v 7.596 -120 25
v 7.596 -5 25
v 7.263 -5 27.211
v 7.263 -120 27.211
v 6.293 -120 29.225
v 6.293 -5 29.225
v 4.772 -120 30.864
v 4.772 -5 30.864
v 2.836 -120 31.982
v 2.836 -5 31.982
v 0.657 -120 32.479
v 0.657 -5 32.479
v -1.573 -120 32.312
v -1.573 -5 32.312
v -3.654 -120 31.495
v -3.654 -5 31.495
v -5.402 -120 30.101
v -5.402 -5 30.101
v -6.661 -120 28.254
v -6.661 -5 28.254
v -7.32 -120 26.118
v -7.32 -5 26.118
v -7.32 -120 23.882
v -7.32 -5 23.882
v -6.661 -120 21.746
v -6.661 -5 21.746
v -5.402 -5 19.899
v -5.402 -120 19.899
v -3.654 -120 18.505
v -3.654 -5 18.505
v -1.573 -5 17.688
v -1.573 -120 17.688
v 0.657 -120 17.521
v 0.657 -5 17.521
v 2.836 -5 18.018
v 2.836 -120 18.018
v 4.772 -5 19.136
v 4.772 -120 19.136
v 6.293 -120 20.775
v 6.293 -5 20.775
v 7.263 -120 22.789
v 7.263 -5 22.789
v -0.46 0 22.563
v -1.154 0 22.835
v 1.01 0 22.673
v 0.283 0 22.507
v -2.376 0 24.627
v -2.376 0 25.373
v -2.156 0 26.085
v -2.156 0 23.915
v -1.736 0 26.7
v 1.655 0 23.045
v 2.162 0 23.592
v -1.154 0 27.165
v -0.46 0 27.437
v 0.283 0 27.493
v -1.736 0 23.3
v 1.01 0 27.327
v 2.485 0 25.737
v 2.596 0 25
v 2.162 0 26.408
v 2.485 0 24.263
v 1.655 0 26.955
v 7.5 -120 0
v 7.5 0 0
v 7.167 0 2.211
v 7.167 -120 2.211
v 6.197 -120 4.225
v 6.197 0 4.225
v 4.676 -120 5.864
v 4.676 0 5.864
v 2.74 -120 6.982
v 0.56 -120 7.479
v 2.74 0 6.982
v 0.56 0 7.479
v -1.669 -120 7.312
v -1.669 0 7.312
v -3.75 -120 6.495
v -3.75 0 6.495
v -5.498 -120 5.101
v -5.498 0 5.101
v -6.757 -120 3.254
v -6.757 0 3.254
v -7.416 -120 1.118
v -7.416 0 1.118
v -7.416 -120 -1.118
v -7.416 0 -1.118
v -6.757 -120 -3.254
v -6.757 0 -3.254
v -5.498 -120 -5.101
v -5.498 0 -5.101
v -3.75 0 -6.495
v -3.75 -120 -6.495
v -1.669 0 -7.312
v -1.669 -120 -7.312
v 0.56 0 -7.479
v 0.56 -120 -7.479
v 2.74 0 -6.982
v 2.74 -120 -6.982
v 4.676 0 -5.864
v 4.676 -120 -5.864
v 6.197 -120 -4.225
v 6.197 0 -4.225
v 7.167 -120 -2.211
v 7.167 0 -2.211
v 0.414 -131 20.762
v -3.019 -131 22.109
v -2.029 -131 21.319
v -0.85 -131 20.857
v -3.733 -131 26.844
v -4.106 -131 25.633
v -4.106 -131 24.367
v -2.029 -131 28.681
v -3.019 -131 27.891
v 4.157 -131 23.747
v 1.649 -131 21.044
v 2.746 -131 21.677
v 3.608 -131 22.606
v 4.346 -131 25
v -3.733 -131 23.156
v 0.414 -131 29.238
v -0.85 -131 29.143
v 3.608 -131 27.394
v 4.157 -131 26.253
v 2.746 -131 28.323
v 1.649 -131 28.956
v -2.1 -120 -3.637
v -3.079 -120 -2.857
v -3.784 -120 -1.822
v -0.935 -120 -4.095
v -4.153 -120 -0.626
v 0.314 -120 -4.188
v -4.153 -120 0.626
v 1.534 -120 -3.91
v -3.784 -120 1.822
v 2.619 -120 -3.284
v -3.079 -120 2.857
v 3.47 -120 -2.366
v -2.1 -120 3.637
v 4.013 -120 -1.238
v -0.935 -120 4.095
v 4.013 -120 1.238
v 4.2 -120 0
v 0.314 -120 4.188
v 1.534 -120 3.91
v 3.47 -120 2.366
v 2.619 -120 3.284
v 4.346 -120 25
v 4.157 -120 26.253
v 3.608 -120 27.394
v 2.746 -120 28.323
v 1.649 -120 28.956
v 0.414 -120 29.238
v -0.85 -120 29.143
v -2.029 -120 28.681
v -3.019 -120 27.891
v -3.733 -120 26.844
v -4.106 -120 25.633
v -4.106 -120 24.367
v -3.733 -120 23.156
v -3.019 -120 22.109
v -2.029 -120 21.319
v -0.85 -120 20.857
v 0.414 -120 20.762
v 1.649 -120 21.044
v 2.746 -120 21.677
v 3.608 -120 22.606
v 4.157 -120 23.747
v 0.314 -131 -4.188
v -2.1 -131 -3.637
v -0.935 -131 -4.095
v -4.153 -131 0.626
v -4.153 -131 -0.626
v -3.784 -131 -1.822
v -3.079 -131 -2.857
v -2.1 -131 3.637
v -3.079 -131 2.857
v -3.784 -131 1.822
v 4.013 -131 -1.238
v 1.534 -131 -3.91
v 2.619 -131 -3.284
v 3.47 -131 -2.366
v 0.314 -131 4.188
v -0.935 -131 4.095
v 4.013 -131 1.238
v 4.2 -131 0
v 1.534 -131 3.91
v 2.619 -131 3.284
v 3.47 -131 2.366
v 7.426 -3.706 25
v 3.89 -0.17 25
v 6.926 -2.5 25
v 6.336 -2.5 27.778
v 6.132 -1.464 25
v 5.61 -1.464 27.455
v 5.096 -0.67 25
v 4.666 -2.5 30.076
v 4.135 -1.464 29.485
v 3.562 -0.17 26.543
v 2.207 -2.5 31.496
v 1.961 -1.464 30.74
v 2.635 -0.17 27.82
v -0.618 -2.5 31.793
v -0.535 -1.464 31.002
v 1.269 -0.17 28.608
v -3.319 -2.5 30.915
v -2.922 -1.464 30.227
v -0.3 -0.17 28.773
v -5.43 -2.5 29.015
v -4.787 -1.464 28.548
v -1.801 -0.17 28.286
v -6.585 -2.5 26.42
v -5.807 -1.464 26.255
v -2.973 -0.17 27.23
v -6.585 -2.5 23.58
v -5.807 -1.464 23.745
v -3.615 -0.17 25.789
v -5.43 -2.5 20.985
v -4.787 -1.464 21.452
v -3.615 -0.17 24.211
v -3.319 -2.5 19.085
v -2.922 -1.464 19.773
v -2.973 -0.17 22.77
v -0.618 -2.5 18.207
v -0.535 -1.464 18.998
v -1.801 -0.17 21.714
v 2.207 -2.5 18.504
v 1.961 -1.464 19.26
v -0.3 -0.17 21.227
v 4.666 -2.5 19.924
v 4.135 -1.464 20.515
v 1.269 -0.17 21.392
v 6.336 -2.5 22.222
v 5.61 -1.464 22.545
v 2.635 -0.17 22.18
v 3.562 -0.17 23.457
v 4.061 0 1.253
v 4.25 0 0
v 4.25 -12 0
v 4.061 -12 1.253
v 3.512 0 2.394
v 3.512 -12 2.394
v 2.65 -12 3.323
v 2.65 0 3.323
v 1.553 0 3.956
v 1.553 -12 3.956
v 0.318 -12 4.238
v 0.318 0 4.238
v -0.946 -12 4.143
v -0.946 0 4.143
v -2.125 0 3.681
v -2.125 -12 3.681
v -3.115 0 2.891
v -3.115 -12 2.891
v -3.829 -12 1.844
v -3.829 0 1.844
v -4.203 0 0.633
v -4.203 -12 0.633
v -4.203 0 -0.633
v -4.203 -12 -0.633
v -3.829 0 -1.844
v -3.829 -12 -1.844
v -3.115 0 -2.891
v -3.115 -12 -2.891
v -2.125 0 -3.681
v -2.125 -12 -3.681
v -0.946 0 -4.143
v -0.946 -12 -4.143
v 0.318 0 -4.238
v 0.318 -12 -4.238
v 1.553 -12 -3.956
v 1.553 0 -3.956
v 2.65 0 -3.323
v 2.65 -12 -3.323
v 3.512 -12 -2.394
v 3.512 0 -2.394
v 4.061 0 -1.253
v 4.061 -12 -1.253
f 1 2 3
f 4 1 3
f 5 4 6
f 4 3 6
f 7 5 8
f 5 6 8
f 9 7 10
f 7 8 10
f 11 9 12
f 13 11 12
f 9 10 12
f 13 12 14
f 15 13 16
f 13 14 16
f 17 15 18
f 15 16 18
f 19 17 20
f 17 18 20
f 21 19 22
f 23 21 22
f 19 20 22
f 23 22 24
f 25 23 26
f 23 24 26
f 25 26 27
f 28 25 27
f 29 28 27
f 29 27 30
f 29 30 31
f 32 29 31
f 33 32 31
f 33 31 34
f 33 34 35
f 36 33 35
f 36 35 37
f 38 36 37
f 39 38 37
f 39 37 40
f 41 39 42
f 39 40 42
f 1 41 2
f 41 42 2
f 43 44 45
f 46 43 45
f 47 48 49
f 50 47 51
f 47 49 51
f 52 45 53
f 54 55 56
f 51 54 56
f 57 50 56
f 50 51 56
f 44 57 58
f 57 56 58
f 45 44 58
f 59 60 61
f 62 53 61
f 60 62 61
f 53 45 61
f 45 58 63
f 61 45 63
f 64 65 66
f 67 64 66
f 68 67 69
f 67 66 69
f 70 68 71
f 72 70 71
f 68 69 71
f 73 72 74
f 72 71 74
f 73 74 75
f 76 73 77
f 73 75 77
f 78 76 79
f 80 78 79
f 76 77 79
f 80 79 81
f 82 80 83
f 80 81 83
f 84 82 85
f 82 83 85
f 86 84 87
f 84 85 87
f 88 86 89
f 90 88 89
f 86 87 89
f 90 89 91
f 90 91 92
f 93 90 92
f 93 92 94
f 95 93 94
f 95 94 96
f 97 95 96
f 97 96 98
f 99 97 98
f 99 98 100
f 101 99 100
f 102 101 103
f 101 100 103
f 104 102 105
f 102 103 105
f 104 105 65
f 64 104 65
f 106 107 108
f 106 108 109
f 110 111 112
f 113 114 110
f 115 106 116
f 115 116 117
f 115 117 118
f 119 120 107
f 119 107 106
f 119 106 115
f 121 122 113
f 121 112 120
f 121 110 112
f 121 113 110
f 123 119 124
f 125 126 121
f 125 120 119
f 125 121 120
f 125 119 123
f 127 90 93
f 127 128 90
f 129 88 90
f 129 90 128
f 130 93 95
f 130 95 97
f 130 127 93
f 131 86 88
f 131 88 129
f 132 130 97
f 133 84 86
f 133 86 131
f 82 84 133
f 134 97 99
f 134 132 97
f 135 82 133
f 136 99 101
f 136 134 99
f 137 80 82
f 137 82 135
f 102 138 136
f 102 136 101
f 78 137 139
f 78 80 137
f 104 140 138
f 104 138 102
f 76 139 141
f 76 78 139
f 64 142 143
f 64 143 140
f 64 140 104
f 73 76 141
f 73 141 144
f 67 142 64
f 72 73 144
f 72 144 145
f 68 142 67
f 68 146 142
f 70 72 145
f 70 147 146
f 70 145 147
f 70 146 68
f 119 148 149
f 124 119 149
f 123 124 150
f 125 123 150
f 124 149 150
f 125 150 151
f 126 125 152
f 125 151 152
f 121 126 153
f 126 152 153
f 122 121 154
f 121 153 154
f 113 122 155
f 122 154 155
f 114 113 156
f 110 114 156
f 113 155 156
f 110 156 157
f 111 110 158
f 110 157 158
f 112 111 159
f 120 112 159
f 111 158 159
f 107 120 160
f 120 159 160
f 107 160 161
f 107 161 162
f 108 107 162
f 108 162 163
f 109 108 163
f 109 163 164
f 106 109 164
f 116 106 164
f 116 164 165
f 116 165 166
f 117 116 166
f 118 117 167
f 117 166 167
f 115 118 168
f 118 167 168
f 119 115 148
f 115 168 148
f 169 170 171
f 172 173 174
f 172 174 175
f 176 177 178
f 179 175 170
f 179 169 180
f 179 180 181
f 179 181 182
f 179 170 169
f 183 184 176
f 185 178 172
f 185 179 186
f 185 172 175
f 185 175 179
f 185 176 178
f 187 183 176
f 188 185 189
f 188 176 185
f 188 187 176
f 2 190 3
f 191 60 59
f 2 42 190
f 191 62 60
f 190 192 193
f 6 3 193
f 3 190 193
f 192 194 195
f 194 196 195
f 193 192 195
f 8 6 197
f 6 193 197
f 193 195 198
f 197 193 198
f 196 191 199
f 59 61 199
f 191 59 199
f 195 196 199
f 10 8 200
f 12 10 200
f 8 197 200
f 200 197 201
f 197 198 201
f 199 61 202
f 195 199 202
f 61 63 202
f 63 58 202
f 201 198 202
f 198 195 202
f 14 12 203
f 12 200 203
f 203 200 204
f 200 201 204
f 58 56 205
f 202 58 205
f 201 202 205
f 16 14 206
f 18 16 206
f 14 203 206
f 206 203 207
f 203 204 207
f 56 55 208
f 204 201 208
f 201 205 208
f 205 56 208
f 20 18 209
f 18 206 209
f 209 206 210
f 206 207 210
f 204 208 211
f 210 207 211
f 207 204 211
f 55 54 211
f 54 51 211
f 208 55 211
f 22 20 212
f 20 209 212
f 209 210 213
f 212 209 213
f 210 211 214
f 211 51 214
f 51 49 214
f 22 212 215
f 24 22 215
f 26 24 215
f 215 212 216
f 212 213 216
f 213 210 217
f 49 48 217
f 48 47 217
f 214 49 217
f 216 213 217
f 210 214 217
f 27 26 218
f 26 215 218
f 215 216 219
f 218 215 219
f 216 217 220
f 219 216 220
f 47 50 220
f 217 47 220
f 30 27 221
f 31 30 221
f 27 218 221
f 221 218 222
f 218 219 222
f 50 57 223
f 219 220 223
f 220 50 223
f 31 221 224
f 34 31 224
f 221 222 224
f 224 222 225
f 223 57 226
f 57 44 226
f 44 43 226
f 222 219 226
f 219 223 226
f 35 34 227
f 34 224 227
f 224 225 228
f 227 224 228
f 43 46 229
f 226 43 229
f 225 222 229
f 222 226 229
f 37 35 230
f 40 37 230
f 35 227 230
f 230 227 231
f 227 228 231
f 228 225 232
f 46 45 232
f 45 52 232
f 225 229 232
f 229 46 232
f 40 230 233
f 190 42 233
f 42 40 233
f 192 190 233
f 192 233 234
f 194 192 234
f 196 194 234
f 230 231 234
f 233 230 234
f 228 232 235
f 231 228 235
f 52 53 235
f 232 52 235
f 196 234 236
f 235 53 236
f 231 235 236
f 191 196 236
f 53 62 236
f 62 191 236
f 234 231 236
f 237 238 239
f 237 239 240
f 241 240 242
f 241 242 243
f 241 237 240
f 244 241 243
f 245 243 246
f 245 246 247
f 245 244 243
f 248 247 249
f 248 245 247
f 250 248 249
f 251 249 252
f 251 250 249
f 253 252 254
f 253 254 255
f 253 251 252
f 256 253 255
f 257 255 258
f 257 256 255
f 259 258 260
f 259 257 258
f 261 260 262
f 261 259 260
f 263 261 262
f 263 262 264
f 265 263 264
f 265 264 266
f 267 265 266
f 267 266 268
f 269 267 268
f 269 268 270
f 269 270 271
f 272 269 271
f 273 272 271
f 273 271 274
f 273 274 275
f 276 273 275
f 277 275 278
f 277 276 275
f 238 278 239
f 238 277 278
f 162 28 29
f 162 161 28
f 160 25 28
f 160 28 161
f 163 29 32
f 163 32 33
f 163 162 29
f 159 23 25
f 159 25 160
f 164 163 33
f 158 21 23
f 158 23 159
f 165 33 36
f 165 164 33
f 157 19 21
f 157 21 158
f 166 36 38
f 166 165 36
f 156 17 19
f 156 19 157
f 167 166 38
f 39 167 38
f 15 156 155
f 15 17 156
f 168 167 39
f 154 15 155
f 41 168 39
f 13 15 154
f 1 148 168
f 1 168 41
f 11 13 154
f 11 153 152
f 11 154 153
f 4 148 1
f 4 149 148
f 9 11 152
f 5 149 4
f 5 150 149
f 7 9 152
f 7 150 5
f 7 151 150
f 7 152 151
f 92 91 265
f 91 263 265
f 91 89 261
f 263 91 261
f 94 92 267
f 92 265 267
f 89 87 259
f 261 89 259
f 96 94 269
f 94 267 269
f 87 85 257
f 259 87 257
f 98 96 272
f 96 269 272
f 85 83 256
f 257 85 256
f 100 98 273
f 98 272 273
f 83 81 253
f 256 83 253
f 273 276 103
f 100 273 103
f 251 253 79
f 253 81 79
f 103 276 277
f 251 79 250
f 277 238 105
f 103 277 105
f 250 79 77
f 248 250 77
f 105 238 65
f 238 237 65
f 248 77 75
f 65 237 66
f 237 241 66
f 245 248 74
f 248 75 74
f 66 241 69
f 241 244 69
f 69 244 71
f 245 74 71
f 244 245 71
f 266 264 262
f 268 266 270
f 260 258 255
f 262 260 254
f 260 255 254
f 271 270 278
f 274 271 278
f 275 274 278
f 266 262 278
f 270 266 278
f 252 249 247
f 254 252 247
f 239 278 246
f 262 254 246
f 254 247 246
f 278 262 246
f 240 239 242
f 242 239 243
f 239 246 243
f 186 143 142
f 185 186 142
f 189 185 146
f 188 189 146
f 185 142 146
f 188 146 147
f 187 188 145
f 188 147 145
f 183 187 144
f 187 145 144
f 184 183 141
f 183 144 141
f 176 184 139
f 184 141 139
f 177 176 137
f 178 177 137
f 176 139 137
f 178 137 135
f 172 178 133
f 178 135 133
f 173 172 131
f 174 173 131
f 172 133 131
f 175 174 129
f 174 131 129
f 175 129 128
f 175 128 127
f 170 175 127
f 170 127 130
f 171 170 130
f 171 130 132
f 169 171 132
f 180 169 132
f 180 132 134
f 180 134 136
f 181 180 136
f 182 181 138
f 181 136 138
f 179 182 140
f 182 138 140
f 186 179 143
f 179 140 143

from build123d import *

# Parameters (mm, degrees)
F0_R     = 7.5
F0_R_2   = 4.25
F1_DEPTH = 120
F2_R     = 4.25
F3_DEPTH = 12
F4_R     = 4.2
F5_DEPTH = 11
F6_R     = 4.25
F7_DEPTH = 11
F8_R     = 5


with BuildPart() as f1:
    # F0 (on Front) → F1 (new body)
    with BuildSketch(Plane.XZ):
        Circle(F0_R)
        Circle(F0_R_2, mode=Mode.SUBTRACT)
        with Locations((0.096153, 25.000002)):
            Circle(F0_R)
        with Locations((0.096153, 25.000002)):
            Circle(F0_R_2, mode=Mode.SUBTRACT)
        Circle(F0_R_2)
        with Locations((0.096153, 25.000002)):
            Circle(F0_R_2)
    extrude(amount=F1_DEPTH)

    # F2 (on Front) → F3 (cut)
    with BuildSketch(Plane.XZ):
        Circle(F2_R)
    extrude(amount=F3_DEPTH, mode=Mode.SUBTRACT)

    # F4 (on face) → F5 (join)
    with BuildSketch(Plane.XZ.offset(120)):
        Circle(F4_R)
    extrude(amount=F5_DEPTH)

    # F6 (on face) → F7 (join)
    with BuildSketch(Plane.XZ.offset(120)):
        with Locations((0.096153, 25.000002)):
            Circle(F6_R)
    extrude(amount=F7_DEPTH)

    # F8
    f8_edges = [f1.edges().sort_by_distance(p)[0] for p in [
        (-7.403847, 0, 25.000002),
    ]]
    fillet(f8_edges, radius=F8_R)


solid = f1.part
